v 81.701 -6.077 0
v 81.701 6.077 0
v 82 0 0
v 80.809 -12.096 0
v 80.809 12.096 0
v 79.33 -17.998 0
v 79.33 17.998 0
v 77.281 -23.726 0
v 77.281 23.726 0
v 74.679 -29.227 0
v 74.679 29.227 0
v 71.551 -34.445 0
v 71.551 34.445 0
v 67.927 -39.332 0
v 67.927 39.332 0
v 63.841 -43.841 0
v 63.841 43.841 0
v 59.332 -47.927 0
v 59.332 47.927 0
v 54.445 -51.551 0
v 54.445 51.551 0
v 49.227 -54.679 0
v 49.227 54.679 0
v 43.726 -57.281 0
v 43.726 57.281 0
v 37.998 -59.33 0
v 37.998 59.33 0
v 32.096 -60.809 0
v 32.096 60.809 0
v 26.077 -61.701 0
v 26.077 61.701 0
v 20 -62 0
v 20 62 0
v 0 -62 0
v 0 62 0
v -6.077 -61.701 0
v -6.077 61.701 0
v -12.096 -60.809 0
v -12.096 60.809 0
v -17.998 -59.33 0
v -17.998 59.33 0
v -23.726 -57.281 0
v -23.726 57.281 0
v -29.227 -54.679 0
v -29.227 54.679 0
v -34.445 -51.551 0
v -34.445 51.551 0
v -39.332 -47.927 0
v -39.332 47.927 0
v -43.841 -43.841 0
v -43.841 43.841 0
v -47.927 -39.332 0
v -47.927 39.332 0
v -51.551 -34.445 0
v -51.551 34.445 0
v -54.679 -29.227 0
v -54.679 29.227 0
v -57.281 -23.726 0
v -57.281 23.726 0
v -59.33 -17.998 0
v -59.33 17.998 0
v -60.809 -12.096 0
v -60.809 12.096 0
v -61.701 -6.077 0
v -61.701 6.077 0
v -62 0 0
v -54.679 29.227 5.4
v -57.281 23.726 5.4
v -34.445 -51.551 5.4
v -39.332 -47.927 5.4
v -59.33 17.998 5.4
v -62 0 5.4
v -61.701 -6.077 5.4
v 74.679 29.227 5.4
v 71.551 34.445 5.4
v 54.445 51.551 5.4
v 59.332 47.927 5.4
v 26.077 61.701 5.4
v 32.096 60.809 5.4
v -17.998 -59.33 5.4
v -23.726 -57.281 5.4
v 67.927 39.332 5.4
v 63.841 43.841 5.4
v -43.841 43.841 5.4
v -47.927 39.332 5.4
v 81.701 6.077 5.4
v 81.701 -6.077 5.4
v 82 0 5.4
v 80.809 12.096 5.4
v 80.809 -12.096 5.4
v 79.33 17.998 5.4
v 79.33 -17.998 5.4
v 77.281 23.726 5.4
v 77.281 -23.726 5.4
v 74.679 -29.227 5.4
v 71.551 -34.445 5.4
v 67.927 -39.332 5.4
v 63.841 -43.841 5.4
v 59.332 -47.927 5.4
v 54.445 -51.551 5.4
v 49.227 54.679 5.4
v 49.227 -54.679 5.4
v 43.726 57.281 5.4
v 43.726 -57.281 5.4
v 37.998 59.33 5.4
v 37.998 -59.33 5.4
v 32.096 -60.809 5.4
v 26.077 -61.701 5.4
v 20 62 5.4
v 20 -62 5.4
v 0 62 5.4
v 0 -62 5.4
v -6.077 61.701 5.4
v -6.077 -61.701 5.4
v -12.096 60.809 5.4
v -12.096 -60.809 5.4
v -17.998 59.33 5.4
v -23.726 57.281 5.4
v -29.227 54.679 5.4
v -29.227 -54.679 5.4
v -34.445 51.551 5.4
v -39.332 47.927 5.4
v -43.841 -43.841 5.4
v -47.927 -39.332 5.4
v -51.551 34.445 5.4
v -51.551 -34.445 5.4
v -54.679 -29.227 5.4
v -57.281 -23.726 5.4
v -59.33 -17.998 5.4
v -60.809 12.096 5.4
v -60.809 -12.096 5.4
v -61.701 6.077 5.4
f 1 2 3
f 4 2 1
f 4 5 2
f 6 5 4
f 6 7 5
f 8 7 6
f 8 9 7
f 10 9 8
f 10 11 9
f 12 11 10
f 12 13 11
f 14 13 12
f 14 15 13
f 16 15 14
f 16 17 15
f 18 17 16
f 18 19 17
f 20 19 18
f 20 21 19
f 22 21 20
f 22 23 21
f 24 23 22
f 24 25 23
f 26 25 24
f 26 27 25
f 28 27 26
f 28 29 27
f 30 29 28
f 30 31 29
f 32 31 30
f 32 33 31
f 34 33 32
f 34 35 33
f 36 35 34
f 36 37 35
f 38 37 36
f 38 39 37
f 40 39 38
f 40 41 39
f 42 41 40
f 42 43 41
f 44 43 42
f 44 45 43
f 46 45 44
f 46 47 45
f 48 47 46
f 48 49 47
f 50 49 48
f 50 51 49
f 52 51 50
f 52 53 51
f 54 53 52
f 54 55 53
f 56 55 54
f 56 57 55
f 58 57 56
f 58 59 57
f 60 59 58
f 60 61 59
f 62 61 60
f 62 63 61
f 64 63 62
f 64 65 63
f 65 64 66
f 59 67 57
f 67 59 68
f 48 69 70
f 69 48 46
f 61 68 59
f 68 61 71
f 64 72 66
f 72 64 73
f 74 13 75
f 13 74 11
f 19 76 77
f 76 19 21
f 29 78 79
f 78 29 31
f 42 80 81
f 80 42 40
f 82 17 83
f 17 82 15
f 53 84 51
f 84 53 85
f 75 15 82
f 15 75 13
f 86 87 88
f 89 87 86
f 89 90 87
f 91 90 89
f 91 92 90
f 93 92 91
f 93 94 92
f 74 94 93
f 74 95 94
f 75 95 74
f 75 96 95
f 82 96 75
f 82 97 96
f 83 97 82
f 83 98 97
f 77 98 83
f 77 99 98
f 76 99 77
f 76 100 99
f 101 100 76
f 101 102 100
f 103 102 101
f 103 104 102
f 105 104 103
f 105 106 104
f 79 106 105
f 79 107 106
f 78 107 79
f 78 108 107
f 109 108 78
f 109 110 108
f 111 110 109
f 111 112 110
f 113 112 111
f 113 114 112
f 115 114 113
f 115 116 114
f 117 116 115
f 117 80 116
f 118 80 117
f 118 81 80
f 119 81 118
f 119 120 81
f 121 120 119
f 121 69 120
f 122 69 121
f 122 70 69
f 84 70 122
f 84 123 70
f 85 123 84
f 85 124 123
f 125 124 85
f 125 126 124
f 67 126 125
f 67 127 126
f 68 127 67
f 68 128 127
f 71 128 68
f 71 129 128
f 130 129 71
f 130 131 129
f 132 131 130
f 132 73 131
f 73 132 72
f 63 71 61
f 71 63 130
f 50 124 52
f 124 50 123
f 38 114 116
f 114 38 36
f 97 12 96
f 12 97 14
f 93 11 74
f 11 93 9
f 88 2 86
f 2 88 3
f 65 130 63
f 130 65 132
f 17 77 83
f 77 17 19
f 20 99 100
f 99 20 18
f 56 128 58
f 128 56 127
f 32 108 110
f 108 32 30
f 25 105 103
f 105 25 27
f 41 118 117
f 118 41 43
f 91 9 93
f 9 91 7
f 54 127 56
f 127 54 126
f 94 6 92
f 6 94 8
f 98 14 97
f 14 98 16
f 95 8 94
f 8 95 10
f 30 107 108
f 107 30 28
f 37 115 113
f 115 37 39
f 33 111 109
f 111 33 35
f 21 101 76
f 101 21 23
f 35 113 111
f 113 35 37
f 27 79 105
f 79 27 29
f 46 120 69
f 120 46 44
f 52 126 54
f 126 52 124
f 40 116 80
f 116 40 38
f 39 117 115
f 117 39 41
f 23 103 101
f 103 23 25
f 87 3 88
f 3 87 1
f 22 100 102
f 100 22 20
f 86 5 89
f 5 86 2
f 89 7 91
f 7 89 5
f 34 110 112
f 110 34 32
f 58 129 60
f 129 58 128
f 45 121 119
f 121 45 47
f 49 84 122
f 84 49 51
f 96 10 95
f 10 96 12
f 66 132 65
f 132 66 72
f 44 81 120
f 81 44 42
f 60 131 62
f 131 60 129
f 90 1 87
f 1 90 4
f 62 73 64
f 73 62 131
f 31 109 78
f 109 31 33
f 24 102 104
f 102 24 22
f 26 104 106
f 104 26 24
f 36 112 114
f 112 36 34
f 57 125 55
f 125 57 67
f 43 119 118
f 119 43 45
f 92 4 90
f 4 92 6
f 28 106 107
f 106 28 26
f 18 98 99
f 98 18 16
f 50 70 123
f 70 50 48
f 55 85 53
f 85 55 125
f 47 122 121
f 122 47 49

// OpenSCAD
x_diameter = 140;
y_diameter = 120;
edge = 2;
height = 5;
foot_diameter = 9.6;

y_radius = y_diameter / 2;
foot_radius = foot_diameter/ 2;

$fn = 64;
module base() {
    x_offset = x_diameter - y_diameter;

    hull() {
        cylinder(h=height, r=y_radius);
        translate([x_offset, 0, 0]) cylinder(h=height, r=y_radius);
    }

    hull() {
        cylinder(h=height+0.4, r=y_radius + edge);
        translate([x_offset, 0, 0]) cylinder(h=height+0.4, r=y_radius + edge);

    }

//    #rotate([0, 0, 30]) translate([0, y_radius - foot_radius, 0]) cylinder(h=0.4, r=foot_radius);
//    #rotate([0, 0, 150]) translate([0, y_radius - foot_radius, 0]) cylinder(h=0.4, r=foot_radius);
    #cylinder(h=0.4, r=foot_radius);
    #rotate([0, 0, 0]) translate([0, y_radius - foot_radius, 0]) translate([x_offset, 0, 0]) cylinder(h=0.4, r=foot_radius);
    // #rotate([0, 0, 45]) translate([x_offset, y_radius - foot_diameter, 0]) cylinder(h=0.4, r=foot_radius);
    // #rotate([0, 0, 135]) translate([x_offset, y_radius - foot_diameter, 0]) cylinder(h=0.4, r=foot_radius);
}

base();
